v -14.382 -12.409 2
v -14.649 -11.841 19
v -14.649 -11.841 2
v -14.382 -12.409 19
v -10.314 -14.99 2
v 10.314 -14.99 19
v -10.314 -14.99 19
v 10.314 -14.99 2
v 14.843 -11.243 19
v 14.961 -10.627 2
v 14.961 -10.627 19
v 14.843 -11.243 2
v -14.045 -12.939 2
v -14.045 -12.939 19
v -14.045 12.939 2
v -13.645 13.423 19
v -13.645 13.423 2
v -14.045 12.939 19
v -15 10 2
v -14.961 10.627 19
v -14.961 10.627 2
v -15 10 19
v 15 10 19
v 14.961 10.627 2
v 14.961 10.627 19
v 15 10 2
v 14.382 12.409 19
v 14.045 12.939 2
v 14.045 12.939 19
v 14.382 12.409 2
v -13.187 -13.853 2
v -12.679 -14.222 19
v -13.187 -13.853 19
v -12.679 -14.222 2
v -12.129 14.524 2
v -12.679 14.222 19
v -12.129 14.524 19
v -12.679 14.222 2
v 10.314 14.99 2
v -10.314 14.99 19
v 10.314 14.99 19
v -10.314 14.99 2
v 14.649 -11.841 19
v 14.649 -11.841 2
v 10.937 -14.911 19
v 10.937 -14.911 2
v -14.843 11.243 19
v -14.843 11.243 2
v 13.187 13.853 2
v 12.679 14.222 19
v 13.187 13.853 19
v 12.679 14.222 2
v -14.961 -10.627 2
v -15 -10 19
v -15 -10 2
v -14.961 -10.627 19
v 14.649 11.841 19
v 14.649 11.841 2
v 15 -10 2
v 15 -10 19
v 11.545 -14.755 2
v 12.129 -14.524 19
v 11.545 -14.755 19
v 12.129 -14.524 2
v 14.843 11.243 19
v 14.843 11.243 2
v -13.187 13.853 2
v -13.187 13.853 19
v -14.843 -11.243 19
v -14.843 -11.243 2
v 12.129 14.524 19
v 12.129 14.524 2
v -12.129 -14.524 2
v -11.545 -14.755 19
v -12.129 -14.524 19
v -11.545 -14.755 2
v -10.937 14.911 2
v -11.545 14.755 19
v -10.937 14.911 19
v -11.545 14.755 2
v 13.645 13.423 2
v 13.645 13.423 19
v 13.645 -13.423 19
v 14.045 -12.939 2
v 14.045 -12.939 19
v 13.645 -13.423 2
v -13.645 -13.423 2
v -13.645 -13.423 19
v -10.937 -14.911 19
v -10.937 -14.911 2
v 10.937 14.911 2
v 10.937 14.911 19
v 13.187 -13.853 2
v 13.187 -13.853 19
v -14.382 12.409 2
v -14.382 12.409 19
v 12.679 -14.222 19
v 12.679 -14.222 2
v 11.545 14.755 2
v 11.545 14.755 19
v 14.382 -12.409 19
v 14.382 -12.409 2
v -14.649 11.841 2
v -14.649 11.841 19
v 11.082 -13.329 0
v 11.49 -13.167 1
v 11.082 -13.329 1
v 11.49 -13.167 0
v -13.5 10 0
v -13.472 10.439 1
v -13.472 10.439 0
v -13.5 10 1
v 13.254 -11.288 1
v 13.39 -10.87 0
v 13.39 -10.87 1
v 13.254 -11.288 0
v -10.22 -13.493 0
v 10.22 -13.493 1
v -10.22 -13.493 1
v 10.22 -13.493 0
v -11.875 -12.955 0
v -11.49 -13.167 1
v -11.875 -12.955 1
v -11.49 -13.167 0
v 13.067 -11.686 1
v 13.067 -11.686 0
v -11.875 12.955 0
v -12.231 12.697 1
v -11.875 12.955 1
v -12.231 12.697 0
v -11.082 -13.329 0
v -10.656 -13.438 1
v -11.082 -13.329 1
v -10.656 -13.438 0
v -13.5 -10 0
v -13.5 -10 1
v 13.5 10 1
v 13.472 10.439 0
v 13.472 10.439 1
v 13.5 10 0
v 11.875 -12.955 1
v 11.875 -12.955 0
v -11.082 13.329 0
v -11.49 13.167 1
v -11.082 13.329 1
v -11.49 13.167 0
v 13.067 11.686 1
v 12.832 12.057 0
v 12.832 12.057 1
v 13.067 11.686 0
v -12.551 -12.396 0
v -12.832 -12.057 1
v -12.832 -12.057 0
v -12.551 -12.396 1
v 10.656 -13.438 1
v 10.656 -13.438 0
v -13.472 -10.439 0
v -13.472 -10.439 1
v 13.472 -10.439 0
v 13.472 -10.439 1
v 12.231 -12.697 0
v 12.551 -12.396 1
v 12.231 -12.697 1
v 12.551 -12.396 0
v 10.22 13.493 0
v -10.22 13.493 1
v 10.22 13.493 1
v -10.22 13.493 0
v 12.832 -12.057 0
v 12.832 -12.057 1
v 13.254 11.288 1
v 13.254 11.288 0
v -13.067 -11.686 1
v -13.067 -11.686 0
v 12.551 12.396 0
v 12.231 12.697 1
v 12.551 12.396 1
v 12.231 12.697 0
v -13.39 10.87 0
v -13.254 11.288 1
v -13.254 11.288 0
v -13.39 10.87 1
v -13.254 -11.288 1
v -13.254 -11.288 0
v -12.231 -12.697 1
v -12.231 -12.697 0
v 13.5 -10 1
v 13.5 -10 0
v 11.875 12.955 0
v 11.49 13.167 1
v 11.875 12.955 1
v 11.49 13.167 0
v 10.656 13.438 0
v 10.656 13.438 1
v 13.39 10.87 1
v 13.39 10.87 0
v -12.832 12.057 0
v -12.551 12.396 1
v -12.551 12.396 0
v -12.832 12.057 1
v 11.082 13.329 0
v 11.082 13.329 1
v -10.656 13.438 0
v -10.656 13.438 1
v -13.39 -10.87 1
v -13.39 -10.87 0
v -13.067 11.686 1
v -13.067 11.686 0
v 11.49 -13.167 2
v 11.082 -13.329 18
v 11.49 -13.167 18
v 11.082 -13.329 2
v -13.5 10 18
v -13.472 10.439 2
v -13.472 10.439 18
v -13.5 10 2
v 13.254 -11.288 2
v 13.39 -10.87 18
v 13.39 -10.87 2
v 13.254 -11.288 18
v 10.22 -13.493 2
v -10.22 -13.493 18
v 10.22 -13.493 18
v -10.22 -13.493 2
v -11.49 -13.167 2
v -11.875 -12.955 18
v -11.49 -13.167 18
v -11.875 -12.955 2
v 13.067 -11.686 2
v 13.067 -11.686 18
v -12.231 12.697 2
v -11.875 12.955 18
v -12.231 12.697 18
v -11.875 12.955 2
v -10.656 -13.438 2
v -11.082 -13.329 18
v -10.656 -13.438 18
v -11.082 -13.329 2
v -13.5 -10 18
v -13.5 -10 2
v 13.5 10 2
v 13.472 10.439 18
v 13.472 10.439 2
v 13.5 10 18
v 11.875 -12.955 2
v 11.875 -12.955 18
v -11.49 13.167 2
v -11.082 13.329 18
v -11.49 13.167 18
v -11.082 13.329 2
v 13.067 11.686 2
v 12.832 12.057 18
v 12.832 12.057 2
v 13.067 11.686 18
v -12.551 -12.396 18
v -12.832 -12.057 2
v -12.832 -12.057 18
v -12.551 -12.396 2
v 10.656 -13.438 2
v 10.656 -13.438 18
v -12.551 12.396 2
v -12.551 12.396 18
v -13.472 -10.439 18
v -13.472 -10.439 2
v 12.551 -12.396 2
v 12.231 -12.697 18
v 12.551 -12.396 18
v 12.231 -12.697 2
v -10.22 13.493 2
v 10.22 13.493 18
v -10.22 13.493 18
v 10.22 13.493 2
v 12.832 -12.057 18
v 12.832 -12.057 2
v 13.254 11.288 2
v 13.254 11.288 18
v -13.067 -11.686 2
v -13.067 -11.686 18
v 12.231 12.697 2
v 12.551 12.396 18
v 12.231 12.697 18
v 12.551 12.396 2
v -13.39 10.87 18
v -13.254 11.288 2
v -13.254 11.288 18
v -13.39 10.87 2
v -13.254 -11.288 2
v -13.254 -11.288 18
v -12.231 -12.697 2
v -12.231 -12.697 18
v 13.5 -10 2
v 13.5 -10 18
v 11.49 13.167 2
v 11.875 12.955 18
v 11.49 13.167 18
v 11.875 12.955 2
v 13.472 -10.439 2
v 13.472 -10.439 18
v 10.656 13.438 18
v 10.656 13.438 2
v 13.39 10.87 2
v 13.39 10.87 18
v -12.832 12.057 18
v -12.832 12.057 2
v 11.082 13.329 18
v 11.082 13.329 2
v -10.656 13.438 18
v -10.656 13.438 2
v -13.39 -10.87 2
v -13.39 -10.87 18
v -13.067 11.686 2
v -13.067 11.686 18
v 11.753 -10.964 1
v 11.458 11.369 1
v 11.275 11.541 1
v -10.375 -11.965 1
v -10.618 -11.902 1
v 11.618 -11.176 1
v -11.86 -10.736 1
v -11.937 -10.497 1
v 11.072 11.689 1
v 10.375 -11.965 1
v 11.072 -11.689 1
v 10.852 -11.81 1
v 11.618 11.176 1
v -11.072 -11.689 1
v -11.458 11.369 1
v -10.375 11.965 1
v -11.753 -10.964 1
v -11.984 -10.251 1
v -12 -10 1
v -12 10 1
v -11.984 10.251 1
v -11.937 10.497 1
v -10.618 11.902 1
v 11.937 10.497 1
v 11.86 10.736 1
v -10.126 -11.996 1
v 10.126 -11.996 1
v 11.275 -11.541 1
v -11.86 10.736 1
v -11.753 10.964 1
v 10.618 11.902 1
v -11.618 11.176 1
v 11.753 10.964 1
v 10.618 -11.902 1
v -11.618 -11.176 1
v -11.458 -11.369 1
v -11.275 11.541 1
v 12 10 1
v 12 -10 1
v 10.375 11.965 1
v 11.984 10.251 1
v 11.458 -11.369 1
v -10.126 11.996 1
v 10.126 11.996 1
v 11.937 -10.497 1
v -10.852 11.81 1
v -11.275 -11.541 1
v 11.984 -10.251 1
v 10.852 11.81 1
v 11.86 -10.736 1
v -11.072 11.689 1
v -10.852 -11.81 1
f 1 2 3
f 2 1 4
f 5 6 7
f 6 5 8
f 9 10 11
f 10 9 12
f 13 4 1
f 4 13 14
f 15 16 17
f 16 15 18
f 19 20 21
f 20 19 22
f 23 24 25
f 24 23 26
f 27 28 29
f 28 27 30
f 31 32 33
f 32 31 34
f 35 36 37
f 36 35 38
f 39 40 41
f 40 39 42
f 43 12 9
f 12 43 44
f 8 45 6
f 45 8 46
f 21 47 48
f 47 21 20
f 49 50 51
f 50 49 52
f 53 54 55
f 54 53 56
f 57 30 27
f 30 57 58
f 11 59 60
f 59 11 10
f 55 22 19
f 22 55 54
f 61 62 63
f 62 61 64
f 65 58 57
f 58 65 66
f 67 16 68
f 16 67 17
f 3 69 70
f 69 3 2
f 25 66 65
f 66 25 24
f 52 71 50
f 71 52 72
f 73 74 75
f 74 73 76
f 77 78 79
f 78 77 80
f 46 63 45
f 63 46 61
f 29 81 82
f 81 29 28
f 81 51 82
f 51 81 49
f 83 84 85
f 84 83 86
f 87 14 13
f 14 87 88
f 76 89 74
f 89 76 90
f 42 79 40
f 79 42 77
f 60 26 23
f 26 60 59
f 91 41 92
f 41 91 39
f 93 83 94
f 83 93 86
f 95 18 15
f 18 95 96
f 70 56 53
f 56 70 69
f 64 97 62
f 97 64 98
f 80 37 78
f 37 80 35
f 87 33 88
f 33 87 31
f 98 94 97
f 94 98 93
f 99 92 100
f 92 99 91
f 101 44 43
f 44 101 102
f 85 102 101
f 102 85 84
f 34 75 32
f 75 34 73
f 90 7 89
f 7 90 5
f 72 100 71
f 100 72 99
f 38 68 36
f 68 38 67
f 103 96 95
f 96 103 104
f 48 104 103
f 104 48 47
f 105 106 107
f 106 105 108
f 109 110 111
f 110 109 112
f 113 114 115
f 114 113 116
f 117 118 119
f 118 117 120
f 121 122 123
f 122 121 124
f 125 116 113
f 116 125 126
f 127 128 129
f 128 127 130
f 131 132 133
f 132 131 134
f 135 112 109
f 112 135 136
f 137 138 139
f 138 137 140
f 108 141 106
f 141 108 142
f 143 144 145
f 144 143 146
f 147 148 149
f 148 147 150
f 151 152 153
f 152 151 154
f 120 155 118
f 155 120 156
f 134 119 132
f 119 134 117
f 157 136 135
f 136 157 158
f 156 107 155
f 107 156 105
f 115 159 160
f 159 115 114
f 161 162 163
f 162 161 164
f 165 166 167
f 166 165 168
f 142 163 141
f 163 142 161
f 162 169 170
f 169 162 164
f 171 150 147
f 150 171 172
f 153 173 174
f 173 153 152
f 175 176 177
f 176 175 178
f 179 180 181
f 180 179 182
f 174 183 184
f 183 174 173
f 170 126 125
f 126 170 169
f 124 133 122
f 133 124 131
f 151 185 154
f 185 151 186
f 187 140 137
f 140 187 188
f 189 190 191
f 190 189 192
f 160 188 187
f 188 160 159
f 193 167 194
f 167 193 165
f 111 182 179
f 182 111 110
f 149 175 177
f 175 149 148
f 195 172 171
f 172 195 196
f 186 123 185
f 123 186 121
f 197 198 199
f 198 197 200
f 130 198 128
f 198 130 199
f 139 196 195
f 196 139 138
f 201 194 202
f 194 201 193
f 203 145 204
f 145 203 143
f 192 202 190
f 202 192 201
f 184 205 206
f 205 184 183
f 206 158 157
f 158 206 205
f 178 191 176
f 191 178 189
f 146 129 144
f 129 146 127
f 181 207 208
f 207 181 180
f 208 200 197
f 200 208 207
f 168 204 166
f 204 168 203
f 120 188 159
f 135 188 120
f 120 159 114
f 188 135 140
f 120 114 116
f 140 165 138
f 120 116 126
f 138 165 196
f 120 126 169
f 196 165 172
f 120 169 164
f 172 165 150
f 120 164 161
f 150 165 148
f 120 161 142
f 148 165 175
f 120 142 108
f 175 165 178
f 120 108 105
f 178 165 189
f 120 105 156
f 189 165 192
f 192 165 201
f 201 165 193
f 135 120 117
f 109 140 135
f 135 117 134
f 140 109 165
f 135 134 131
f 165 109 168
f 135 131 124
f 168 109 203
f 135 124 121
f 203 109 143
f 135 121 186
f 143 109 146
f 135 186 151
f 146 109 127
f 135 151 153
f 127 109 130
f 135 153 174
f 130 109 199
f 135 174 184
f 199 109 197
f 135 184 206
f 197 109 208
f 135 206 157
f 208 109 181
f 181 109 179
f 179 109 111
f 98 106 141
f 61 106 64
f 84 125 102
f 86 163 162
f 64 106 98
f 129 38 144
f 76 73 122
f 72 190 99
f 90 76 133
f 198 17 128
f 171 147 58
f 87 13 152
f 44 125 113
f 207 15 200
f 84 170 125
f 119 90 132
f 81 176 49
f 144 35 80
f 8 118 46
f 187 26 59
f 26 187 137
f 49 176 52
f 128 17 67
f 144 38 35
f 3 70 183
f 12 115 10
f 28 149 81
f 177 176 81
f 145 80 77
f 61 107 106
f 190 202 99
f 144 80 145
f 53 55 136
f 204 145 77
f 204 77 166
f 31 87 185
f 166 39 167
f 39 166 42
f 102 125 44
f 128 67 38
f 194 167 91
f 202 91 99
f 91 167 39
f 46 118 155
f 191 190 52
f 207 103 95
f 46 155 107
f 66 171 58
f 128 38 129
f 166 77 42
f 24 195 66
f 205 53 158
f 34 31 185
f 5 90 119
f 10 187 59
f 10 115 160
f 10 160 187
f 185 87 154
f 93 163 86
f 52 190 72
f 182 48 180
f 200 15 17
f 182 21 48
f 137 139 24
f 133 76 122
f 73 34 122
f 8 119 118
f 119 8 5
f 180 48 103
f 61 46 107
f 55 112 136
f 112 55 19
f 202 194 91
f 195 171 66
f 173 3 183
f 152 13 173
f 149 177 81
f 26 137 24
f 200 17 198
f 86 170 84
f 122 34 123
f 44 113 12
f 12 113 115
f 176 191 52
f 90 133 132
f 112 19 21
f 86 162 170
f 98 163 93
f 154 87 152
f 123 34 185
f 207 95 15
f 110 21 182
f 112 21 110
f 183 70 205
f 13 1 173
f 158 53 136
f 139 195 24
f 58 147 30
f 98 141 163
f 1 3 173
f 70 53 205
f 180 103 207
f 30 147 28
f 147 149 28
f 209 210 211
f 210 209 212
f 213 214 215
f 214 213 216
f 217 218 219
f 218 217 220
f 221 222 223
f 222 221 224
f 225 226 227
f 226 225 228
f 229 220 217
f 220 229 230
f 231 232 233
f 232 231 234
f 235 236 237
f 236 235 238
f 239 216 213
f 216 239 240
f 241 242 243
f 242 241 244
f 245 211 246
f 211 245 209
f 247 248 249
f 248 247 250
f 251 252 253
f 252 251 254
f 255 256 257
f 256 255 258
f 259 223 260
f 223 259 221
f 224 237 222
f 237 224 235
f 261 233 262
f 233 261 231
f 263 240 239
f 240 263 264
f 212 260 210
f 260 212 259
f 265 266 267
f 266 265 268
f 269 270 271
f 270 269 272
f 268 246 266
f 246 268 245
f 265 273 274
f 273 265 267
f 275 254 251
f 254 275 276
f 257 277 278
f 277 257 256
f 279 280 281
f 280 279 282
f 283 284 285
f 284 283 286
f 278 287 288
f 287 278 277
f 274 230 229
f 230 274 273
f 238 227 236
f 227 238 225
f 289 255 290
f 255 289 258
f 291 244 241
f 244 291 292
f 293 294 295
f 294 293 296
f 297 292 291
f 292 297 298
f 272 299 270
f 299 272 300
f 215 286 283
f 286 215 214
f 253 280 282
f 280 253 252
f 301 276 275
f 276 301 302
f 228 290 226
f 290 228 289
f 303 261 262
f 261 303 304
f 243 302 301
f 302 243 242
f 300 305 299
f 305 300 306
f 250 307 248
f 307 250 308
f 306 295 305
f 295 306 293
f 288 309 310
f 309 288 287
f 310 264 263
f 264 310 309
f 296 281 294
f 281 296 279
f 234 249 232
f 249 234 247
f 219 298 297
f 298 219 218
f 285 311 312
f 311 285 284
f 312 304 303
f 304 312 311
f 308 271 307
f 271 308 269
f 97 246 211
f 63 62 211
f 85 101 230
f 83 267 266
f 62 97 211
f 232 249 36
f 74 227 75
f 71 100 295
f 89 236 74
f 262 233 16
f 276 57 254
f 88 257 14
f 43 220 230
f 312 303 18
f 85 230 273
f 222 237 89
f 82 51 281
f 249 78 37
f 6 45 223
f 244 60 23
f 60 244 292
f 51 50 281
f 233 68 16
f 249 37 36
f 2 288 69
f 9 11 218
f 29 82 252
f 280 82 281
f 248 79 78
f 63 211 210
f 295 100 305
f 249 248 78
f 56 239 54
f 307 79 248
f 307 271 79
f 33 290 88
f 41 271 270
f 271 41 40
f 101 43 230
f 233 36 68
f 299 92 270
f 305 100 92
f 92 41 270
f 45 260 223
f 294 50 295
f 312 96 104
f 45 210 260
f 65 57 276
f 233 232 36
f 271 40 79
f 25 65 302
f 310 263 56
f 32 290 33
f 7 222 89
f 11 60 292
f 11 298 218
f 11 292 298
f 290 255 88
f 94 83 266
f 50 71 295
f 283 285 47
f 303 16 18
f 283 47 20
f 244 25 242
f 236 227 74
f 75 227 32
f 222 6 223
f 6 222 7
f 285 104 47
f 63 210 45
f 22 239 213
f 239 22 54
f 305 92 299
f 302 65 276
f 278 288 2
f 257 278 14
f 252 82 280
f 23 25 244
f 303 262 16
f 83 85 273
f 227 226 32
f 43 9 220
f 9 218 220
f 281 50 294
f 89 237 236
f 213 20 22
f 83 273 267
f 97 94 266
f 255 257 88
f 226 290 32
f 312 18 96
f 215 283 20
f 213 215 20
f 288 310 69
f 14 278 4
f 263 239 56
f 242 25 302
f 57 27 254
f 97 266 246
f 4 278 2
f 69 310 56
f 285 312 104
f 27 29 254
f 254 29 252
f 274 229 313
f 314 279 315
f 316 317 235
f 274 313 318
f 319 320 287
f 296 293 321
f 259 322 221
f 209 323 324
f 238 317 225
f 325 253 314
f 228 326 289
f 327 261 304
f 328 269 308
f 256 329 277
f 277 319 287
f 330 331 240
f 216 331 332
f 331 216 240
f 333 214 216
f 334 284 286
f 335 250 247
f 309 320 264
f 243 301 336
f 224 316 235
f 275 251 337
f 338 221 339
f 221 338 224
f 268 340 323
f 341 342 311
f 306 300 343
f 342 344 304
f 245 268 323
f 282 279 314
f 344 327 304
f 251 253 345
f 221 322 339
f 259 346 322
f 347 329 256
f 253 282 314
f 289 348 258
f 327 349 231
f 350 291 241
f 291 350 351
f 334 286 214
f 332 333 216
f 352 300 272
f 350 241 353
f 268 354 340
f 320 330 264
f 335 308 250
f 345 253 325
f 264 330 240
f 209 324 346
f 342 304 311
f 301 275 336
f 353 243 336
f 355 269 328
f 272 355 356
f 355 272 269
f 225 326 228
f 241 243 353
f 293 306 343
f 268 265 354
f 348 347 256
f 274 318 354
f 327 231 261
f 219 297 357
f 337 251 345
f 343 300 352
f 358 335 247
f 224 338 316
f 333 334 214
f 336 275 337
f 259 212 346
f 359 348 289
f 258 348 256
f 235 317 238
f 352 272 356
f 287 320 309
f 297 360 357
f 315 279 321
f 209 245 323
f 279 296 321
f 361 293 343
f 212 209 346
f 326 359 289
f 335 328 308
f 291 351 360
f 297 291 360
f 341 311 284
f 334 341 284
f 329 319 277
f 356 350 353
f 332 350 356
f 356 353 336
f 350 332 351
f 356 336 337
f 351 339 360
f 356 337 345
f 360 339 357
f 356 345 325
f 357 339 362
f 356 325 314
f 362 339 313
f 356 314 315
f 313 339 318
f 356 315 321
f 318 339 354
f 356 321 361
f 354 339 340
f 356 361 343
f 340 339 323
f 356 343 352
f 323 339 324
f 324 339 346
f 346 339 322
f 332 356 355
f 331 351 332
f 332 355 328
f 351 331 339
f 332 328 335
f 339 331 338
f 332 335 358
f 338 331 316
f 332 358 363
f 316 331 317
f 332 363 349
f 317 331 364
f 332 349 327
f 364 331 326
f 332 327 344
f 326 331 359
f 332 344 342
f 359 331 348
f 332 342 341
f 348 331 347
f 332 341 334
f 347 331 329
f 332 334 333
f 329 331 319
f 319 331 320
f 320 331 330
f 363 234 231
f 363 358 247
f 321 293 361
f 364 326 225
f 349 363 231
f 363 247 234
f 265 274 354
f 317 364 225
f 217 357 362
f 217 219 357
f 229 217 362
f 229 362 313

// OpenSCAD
$fn = 50;


difference() {
	union() {
		translate(v = [0, 0, 2]) {
			hull() {
				translate(v = [-10.0000000000, 10.0000000000, 0]) {
					cylinder(h = 17, r = 5);
				}
				translate(v = [10.0000000000, 10.0000000000, 0]) {
					cylinder(h = 17, r = 5);
				}
				translate(v = [-10.0000000000, -10.0000000000, 0]) {
					cylinder(h = 17, r = 5);
				}
				translate(v = [10.0000000000, -10.0000000000, 0]) {
					cylinder(h = 17, r = 5);
				}
			}
		}
		hull() {
			translate(v = [-10.0000000000, 10.0000000000, 0]) {
				cylinder(h = 1, r = 3.5000000000);
			}
			translate(v = [10.0000000000, 10.0000000000, 0]) {
				cylinder(h = 1, r = 3.5000000000);
			}
			translate(v = [-10.0000000000, -10.0000000000, 0]) {
				cylinder(h = 1, r = 3.5000000000);
			}
			translate(v = [10.0000000000, -10.0000000000, 0]) {
				cylinder(h = 1, r = 3.5000000000);
			}
		}
		translate(v = [0, 0, 1]) {
			hull() {
				translate(v = [-10.0000000000, 10.0000000000, 0]) {
					cylinder(h = 1, r1 = 3.5000000000, r2 = 5.0000000000);
				}
				translate(v = [10.0000000000, 10.0000000000, 0]) {
					cylinder(h = 1, r1 = 3.5000000000, r2 = 5.0000000000);
				}
				translate(v = [-10.0000000000, -10.0000000000, 0]) {
					cylinder(h = 1, r1 = 3.5000000000, r2 = 5.0000000000);
				}
				translate(v = [10.0000000000, -10.0000000000, 0]) {
					cylinder(h = 1, r1 = 3.5000000000, r2 = 5.0000000000);
				}
			}
		}
	}
	union() {
		translate(v = [0, 0, 2]) {
			#hull() {
				translate(v = [-10.0000000000, 10.0000000000, 0]) {
					cylinder(h = 17, r = 3.5000000000);
				}
				translate(v = [10.0000000000, 10.0000000000, 0]) {
					cylinder(h = 17, r = 3.5000000000);
				}
				translate(v = [-10.0000000000, -10.0000000000, 0]) {
					cylinder(h = 17, r = 3.5000000000);
				}
				translate(v = [10.0000000000, -10.0000000000, 0]) {
					cylinder(h = 17, r = 3.5000000000);
				}
			}
		}
		translate(v = [0, 0, 18]) {
			hull() {
				translate(v = [-10.0000000000, 10.0000000000, 0]) {
					cylinder(h = 1, r1 = 3.5000000000, r2 = 5.0000000000);
				}
				translate(v = [10.0000000000, 10.0000000000, 0]) {
					cylinder(h = 1, r1 = 3.5000000000, r2 = 5.0000000000);
				}
				translate(v = [-10.0000000000, -10.0000000000, 0]) {
					cylinder(h = 1, r1 = 3.5000000000, r2 = 5.0000000000);
				}
				translate(v = [10.0000000000, -10.0000000000, 0]) {
					cylinder(h = 1, r1 = 3.5000000000, r2 = 5.0000000000);
				}
			}
		}
		translate(v = [0, 0, 1]) {
			#hull() {
				translate(v = [-10.0000000000, 10.0000000000, 0]) {
					cylinder(h = 1, r1 = 2.0000000000, r2 = 3.5000000000);
				}
				translate(v = [10.0000000000, 10.0000000000, 0]) {
					cylinder(h = 1, r1 = 2.0000000000, r2 = 3.5000000000);
				}
				translate(v = [-10.0000000000, -10.0000000000, 0]) {
					cylinder(h = 1, r1 = 2.0000000000, r2 = 3.5000000000);
				}
				translate(v = [10.0000000000, -10.0000000000, 0]) {
					cylinder(h = 1, r1 = 2.0000000000, r2 = 3.5000000000);
				}
			}
		}
	}
}
